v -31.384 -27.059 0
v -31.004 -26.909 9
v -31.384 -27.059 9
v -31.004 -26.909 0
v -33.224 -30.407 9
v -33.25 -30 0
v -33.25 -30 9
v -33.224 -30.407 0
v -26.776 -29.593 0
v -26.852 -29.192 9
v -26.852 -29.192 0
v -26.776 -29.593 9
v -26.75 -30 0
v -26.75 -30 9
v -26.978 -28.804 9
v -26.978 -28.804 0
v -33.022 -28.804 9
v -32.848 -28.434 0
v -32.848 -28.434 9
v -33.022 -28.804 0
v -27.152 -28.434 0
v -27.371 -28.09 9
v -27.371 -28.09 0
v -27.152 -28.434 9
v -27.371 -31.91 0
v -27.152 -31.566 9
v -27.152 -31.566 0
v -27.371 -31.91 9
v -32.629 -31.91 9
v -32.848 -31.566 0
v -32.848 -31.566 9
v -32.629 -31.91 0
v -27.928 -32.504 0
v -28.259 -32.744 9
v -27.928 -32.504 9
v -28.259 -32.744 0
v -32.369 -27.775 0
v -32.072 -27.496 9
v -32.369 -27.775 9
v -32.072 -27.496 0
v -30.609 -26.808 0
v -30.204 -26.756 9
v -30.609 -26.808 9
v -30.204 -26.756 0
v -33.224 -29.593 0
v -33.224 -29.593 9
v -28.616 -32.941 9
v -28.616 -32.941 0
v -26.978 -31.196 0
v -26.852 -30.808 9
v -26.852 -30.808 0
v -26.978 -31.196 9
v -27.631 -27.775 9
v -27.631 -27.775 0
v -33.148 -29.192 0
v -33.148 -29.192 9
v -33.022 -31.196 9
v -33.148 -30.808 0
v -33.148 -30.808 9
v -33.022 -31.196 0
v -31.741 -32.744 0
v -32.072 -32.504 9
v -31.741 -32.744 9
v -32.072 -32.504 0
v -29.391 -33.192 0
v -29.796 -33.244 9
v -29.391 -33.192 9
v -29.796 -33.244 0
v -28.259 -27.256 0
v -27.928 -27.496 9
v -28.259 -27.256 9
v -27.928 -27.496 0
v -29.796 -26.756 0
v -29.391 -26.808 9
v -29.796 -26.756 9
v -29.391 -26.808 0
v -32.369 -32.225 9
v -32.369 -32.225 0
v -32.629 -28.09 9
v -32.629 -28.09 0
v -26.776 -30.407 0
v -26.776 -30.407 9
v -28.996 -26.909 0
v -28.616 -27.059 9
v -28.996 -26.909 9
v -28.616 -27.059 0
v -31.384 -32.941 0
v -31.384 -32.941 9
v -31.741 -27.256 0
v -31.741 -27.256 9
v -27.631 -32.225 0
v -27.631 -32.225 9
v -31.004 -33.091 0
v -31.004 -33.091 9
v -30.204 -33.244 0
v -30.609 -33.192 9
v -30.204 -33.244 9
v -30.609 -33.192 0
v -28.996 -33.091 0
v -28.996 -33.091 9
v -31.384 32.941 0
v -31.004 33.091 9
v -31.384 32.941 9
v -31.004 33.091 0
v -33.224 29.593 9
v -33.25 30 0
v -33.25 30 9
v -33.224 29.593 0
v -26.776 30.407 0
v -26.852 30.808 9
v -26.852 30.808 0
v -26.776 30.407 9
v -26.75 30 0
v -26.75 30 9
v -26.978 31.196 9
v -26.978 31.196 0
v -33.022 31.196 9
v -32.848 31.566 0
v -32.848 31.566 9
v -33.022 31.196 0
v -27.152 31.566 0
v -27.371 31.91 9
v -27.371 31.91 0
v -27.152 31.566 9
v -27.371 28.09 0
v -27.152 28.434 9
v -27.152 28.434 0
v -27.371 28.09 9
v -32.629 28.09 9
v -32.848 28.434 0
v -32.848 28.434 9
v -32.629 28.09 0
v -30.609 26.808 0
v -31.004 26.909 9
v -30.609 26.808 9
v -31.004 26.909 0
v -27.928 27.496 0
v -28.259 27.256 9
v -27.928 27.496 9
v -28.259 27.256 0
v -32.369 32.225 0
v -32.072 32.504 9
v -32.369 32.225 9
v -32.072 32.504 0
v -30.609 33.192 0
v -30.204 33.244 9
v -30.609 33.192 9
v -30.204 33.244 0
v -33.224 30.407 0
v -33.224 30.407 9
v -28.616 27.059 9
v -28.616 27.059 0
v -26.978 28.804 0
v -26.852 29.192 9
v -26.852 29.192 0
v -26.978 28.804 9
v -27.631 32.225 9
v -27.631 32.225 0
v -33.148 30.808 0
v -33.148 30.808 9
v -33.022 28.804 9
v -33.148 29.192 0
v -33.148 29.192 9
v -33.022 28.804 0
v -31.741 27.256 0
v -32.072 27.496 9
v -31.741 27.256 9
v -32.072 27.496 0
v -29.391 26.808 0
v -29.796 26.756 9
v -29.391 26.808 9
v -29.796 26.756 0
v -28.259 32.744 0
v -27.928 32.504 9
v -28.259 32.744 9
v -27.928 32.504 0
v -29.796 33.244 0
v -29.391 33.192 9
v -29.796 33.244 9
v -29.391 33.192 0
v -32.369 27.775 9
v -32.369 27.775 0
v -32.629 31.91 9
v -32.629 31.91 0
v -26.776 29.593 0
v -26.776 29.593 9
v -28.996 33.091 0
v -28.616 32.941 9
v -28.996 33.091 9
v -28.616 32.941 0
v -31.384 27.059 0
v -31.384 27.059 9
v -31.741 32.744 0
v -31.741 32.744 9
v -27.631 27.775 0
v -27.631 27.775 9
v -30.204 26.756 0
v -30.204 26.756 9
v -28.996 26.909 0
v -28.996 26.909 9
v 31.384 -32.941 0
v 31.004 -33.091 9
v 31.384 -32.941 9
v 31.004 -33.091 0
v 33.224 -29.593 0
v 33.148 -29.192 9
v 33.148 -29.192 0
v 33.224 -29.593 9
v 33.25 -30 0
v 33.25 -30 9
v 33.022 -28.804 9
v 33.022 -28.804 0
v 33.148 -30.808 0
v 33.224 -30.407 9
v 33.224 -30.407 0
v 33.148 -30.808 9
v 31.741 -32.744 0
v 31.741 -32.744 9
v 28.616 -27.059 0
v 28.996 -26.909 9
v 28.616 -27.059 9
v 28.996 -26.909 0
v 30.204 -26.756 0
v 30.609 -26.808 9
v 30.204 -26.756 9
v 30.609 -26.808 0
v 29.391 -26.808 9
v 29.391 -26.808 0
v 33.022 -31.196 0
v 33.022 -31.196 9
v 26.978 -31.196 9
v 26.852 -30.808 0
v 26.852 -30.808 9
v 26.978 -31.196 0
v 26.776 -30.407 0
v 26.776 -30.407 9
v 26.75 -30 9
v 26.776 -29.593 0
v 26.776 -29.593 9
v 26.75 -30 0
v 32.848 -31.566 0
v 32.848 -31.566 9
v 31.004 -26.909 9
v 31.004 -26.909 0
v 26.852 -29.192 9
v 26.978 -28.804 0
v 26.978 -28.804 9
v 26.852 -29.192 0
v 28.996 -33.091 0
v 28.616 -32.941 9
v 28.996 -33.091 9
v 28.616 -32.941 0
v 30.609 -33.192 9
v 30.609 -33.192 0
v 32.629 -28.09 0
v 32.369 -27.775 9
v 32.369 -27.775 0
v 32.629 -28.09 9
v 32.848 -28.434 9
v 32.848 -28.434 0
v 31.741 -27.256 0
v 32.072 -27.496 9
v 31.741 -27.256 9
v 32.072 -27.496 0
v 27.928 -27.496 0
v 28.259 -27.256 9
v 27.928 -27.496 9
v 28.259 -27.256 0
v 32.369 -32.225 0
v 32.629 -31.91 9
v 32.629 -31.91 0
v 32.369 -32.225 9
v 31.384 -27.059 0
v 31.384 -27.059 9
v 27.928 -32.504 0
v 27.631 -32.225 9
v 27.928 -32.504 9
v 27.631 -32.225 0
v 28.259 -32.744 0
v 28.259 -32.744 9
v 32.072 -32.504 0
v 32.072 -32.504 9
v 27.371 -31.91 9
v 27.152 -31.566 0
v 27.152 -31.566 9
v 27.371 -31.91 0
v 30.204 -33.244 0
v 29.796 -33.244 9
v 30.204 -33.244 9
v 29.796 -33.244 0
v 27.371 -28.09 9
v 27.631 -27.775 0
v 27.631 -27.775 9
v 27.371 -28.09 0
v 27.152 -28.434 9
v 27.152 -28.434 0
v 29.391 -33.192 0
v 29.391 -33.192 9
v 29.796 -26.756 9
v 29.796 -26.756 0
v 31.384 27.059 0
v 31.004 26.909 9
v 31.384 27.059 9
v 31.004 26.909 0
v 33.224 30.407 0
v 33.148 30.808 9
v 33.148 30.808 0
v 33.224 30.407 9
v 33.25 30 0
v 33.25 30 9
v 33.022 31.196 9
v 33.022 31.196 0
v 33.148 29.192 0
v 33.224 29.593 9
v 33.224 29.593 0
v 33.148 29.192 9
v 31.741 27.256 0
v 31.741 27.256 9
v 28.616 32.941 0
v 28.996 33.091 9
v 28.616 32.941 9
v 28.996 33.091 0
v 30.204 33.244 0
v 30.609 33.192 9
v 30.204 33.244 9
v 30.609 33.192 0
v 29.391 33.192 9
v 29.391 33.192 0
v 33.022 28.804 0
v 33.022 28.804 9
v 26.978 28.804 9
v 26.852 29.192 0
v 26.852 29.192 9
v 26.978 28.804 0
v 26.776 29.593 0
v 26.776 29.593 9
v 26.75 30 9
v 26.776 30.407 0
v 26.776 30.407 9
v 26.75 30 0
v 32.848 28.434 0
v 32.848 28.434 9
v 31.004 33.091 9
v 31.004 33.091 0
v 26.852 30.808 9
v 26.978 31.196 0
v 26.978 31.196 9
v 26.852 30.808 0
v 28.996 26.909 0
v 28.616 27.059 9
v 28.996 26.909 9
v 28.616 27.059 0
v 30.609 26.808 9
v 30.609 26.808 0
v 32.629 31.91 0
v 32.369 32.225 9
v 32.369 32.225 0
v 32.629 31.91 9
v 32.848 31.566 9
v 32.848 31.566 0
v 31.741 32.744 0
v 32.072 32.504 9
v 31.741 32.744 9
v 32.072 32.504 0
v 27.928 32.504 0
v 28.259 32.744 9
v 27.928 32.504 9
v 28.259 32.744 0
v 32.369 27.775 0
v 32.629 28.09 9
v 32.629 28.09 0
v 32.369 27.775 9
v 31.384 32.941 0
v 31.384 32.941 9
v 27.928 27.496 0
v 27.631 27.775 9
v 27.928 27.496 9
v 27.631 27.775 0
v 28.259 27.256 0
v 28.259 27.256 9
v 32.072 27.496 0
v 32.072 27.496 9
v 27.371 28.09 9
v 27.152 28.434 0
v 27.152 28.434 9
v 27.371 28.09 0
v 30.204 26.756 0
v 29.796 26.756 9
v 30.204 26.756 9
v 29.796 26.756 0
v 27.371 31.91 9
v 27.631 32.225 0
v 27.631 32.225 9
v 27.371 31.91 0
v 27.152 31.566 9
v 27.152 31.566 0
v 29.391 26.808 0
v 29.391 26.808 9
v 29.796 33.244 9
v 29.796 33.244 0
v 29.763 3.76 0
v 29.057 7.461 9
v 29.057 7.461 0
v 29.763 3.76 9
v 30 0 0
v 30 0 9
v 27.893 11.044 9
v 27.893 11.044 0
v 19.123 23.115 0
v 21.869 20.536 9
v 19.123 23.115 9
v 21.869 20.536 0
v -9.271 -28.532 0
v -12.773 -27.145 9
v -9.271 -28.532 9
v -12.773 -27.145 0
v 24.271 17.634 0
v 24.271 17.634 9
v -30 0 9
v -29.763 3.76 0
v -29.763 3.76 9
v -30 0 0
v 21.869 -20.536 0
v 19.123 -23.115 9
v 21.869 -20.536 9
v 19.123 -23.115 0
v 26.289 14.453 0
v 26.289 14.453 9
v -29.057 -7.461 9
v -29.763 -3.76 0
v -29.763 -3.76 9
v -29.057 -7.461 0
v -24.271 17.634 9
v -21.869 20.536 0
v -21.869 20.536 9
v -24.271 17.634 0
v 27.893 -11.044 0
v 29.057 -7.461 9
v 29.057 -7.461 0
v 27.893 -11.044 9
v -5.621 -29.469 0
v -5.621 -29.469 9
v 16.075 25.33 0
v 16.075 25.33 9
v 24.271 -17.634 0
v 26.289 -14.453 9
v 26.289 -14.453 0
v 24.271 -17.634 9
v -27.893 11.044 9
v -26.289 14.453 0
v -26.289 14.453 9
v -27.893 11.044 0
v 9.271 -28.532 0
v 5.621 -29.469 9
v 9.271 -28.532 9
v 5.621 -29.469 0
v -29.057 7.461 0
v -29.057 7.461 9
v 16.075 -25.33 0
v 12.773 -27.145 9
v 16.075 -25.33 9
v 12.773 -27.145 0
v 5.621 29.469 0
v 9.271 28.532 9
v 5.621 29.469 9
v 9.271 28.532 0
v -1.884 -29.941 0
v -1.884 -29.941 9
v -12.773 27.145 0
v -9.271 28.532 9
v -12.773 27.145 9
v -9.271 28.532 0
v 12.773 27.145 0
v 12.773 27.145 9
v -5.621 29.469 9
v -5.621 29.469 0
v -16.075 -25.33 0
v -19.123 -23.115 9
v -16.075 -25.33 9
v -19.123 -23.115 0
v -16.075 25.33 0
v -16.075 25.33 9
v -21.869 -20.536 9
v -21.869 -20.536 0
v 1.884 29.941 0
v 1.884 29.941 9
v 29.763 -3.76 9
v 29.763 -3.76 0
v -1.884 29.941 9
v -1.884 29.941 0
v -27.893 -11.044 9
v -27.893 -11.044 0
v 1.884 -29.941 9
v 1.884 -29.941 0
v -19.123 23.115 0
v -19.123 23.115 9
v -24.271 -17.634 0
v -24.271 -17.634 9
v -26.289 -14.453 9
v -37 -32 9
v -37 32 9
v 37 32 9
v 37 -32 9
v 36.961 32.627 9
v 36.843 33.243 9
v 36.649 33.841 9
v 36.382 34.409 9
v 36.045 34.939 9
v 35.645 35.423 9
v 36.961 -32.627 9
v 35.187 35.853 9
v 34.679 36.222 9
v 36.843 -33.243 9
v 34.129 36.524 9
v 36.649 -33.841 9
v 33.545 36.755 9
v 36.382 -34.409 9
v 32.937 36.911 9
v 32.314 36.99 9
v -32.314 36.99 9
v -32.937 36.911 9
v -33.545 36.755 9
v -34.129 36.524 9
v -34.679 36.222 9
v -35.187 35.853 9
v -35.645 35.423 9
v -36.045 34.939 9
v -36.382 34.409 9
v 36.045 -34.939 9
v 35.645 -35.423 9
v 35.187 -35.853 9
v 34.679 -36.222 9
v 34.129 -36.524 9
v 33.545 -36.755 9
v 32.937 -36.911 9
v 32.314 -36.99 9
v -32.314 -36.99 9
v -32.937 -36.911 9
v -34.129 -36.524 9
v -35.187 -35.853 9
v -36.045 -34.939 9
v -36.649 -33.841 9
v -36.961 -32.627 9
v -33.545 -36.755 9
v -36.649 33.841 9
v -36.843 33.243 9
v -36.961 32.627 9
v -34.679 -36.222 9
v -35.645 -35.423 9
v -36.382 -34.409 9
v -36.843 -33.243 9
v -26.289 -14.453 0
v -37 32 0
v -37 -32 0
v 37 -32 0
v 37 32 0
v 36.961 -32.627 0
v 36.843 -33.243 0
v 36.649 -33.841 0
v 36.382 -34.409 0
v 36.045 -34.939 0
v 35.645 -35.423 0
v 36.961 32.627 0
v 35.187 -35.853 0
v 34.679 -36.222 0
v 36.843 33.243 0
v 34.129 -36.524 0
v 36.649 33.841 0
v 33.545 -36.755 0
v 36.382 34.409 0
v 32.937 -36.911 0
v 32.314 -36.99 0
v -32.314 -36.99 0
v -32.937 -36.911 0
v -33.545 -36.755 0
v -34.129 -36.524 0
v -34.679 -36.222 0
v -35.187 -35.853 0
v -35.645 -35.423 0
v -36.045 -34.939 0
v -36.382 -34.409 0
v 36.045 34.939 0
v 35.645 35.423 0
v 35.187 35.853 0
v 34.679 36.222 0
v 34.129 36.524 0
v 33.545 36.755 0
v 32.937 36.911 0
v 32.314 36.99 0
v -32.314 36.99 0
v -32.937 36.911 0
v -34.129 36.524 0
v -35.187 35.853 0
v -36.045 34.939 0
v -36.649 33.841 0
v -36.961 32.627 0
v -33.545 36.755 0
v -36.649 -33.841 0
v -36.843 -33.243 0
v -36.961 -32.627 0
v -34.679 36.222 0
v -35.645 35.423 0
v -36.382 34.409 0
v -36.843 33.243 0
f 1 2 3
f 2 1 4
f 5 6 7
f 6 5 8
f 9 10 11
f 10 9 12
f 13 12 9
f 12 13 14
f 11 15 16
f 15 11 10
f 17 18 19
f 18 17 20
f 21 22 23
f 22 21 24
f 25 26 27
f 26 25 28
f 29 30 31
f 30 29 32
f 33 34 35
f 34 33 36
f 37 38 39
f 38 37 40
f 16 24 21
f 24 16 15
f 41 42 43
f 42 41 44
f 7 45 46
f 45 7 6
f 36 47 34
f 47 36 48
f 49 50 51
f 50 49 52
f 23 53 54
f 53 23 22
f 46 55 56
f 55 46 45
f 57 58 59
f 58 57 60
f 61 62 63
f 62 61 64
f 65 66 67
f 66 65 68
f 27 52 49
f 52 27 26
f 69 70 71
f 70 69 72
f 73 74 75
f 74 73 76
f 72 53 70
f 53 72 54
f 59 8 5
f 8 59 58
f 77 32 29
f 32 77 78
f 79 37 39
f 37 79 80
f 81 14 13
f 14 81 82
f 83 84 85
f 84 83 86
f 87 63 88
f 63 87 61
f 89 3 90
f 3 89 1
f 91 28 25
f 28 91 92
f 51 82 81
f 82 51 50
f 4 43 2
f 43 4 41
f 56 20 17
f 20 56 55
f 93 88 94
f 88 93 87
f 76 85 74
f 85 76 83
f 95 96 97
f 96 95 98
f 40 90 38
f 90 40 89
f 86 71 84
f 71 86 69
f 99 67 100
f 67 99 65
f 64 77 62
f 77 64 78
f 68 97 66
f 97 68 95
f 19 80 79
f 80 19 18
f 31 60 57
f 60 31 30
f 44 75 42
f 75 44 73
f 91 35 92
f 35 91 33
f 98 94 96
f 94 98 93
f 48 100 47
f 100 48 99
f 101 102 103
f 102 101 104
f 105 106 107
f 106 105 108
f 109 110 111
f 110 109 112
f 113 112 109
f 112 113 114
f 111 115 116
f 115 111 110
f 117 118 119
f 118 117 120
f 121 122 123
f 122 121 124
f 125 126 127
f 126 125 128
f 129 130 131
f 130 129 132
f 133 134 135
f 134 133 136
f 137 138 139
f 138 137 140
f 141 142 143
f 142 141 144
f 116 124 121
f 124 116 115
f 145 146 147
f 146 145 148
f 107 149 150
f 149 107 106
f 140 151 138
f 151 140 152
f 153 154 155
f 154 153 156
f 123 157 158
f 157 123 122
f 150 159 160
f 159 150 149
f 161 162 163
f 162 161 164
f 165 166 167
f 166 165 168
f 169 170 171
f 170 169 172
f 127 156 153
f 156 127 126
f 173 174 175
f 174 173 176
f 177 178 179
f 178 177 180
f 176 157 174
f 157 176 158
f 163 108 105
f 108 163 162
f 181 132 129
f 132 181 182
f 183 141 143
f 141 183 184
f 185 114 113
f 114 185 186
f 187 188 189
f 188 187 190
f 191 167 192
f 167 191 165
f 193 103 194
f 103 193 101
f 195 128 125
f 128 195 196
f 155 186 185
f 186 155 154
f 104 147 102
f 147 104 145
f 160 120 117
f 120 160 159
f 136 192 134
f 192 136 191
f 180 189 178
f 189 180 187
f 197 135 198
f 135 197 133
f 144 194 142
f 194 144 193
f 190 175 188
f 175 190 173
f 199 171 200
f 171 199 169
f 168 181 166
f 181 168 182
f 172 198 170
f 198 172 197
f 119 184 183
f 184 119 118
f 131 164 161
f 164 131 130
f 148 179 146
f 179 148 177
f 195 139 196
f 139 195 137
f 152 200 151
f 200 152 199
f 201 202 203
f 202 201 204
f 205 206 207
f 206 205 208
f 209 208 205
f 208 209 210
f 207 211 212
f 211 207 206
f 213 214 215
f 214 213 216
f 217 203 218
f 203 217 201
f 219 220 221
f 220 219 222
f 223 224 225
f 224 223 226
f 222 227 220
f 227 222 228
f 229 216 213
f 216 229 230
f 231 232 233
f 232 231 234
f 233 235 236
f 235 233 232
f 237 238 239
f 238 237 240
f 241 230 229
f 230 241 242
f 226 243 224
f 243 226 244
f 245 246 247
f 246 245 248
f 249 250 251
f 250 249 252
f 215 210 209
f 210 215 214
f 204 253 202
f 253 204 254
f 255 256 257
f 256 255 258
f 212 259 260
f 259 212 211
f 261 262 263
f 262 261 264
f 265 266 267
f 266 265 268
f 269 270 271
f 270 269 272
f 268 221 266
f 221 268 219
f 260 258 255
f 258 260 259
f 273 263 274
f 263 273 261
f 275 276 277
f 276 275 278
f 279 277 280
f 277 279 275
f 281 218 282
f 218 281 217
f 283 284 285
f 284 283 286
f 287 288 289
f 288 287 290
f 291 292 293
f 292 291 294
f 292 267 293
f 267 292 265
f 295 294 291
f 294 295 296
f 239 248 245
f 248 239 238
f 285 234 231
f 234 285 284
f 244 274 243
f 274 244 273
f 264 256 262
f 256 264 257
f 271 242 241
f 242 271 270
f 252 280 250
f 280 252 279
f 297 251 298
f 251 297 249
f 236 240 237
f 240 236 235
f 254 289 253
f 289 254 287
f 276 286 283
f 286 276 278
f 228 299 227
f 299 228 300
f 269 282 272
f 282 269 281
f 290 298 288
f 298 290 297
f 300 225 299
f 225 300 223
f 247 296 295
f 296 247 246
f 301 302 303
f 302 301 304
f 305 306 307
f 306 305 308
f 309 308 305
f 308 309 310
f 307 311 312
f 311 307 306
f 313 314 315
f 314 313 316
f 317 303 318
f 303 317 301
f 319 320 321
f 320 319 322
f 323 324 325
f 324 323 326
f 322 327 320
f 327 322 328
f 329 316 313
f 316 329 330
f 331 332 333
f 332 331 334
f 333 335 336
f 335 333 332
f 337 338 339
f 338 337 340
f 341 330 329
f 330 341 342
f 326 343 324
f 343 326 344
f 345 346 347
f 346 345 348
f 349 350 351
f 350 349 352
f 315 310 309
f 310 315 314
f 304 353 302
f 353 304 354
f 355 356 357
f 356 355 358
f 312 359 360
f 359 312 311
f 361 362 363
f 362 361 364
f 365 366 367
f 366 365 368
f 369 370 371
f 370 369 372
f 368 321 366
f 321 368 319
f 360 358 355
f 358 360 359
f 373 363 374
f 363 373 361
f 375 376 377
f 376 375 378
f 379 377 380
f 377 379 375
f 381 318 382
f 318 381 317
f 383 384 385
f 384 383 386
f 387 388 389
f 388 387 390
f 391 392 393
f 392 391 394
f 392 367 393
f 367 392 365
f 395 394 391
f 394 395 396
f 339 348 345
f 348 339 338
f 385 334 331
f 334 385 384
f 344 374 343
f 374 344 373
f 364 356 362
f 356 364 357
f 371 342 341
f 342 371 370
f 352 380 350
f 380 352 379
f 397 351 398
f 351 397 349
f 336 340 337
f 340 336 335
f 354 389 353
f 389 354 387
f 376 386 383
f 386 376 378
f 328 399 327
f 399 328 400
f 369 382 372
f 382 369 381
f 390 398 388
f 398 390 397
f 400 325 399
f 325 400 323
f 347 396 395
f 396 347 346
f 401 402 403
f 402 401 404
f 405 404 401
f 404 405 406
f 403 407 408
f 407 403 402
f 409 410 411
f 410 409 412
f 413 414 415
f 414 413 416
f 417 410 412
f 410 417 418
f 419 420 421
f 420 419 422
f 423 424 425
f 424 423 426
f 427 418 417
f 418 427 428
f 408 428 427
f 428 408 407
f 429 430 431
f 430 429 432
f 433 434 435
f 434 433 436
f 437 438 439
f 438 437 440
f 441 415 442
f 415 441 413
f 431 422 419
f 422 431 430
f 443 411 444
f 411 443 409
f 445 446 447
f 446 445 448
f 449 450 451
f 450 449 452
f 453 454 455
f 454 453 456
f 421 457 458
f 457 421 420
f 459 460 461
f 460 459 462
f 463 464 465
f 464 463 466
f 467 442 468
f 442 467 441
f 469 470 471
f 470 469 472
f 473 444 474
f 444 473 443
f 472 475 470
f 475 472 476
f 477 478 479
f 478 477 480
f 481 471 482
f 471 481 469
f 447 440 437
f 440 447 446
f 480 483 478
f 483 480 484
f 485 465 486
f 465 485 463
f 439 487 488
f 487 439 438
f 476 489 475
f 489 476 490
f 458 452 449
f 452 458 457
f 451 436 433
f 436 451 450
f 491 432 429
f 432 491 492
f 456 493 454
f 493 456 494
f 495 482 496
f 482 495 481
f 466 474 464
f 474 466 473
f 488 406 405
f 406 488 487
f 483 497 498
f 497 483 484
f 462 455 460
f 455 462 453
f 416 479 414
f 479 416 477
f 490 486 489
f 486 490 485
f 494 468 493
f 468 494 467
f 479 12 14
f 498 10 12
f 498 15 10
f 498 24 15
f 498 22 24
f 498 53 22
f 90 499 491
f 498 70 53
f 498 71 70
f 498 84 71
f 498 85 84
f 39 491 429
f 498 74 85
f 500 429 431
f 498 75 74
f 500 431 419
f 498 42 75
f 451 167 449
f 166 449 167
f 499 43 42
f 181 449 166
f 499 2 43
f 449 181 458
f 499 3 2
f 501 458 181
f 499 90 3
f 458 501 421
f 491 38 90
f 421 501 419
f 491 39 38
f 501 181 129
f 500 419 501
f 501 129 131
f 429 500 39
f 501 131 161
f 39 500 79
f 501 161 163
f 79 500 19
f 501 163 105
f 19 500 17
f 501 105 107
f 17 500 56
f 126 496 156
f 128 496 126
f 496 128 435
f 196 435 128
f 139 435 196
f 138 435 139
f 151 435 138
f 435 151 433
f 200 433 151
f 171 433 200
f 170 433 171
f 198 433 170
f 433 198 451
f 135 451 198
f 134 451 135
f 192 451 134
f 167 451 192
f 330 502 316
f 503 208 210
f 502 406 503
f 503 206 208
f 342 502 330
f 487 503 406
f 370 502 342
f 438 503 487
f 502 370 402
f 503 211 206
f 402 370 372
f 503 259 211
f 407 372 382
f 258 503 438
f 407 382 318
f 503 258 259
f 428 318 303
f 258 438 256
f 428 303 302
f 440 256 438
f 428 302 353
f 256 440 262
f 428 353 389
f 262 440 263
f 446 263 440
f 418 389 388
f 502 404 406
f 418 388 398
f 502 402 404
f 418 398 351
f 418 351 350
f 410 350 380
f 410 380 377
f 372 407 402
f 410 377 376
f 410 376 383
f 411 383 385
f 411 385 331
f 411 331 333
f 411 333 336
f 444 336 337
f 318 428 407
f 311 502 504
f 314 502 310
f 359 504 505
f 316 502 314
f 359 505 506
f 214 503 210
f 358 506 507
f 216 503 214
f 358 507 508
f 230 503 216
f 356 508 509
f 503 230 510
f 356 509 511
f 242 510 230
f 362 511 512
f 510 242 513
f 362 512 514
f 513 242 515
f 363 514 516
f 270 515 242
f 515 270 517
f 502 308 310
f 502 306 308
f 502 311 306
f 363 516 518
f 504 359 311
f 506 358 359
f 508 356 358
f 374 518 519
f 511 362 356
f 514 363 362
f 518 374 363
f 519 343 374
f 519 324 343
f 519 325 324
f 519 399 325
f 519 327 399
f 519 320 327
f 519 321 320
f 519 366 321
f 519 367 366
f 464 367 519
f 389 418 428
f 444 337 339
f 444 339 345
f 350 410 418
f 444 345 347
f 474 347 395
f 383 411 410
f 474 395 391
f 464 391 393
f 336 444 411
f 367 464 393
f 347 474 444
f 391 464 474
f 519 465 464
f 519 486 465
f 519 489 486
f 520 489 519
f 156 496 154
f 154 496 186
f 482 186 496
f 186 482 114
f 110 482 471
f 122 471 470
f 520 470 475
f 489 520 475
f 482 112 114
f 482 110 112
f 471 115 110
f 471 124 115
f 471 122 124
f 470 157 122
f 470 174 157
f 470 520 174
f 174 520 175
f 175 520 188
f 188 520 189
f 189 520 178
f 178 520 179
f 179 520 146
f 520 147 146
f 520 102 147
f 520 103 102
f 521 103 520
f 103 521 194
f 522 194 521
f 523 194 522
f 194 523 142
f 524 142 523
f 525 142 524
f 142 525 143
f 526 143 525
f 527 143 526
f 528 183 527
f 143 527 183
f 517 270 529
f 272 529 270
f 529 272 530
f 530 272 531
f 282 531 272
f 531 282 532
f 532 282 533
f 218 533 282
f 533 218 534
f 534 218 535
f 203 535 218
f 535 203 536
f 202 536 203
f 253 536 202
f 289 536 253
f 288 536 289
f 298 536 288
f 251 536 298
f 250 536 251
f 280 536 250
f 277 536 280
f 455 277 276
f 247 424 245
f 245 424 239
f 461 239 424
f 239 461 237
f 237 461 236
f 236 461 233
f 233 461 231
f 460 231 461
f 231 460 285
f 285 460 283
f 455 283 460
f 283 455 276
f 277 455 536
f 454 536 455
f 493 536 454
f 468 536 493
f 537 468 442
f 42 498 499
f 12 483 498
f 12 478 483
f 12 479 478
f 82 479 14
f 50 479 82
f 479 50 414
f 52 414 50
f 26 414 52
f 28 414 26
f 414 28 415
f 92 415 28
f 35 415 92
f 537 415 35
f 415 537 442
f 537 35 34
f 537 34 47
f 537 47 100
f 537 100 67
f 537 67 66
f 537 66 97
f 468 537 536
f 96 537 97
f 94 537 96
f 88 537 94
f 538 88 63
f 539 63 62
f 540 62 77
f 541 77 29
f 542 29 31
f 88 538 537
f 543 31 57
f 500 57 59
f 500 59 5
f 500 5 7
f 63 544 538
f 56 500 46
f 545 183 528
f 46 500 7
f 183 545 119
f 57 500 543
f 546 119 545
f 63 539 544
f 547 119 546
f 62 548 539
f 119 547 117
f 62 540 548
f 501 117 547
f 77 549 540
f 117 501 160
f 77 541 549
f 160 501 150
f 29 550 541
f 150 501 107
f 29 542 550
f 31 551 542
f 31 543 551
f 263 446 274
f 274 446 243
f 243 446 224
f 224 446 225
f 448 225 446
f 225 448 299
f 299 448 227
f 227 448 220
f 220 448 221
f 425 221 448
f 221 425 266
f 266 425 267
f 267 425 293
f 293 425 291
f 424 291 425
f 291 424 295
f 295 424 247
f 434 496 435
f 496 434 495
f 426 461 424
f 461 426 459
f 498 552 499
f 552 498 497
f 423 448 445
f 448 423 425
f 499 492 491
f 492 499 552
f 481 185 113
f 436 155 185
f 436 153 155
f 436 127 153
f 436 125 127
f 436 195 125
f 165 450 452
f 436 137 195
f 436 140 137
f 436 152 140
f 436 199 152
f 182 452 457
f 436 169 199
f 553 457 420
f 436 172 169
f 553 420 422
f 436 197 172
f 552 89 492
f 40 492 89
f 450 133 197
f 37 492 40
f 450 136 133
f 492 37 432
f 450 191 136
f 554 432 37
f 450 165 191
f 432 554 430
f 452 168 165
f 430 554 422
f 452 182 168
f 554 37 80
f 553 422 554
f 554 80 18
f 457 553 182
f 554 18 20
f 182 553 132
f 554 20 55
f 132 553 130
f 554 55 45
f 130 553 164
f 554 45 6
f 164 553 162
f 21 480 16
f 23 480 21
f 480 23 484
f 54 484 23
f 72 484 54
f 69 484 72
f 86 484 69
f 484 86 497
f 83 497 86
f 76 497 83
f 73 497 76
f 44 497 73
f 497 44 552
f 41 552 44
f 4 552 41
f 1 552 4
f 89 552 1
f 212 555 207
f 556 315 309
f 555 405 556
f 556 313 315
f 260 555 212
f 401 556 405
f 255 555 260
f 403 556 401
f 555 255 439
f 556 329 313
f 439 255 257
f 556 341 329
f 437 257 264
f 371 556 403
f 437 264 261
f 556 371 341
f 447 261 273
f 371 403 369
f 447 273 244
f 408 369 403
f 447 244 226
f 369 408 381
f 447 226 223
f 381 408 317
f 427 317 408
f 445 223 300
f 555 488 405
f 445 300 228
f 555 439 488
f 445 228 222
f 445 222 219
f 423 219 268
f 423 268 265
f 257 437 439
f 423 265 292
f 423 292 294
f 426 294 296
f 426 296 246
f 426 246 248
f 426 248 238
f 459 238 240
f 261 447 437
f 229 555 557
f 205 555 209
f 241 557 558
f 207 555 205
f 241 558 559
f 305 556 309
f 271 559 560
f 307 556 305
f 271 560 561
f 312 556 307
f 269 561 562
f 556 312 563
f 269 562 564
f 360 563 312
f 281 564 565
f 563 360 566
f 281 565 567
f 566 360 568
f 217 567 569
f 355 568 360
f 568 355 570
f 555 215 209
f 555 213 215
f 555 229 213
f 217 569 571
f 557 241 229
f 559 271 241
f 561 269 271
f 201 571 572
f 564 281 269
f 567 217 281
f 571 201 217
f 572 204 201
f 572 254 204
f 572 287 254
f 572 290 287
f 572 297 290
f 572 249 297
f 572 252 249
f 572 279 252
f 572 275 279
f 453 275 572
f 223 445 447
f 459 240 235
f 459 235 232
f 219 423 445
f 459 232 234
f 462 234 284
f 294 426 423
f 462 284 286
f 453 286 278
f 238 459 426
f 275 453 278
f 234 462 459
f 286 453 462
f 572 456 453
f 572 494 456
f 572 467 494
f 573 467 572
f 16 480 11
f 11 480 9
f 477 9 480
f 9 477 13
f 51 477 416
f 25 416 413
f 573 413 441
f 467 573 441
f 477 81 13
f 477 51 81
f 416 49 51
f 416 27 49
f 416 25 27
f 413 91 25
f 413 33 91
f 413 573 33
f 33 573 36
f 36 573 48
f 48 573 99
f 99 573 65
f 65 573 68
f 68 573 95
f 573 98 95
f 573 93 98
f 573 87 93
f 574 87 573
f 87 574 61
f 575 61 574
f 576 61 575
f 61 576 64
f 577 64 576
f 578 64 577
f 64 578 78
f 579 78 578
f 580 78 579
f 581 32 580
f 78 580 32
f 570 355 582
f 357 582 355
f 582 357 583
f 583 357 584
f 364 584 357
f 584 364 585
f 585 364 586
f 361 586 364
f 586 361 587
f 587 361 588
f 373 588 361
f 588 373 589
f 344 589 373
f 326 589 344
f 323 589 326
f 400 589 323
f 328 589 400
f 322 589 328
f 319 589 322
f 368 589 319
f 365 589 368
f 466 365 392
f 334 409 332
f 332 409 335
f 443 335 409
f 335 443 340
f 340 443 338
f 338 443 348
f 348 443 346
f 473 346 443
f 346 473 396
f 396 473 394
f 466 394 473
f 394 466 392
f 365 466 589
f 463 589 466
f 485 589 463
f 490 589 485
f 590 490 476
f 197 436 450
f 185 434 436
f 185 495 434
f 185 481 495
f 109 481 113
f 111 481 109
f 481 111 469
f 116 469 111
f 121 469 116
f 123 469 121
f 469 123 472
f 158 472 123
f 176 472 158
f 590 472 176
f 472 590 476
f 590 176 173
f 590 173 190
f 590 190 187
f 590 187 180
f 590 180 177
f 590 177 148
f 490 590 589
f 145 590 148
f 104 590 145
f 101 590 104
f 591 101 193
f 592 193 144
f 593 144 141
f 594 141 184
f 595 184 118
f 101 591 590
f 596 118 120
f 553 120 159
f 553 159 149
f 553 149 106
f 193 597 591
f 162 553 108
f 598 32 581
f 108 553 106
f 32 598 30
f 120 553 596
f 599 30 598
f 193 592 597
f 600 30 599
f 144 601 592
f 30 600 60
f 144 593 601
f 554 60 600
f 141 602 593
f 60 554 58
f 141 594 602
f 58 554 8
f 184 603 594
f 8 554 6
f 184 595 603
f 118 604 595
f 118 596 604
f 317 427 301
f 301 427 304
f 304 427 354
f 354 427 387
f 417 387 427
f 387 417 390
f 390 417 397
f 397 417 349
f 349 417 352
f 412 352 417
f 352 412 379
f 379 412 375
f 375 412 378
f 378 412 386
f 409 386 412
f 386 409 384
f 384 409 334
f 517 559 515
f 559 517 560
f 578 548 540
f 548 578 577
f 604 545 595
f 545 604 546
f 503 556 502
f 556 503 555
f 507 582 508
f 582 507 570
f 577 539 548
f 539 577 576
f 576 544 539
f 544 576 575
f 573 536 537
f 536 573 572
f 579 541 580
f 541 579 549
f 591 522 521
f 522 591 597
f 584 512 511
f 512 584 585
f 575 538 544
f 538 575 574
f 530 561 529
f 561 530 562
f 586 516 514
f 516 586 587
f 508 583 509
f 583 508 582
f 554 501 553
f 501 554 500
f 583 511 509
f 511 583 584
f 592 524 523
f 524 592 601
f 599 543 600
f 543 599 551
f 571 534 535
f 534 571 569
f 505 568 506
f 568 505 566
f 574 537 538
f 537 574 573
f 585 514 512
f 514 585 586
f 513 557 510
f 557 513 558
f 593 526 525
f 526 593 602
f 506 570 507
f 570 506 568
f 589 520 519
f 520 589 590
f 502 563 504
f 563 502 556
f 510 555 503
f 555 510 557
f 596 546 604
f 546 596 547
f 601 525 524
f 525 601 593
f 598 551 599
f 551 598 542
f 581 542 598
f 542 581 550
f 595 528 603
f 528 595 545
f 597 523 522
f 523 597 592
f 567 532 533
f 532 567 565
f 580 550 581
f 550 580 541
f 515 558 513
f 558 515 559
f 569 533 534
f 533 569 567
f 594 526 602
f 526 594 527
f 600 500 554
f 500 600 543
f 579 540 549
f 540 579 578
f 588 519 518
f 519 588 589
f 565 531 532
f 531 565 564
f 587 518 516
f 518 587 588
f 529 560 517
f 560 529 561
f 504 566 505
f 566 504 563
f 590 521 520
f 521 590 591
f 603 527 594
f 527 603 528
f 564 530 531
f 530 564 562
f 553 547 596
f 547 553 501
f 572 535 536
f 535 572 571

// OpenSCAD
$fn = 50;

difference() {
	union() {
		hull() {
			translate(v = [-32.0, 32.0, 0]) {
				cylinder(h = 9, r = 5);
			}
			translate(v = [32.0, 32.0, 0]) {
				cylinder(h = 9, r = 5);
			}
			translate(v = [-32.0, -32.0, 0]) {
				cylinder(h = 9, r = 5);
			}
			translate(v = [32.0, -32.0, 0]) {
				cylinder(h = 9, r = 5);
			}
		}
	}
	union() {
		translate(v = [-30.0, -30.0, -100.0]) {
			cylinder(h = 200, r = 3.25);
		}
		translate(v = [-30.0, 30.0, -100.0]) {
			cylinder(h = 200, r = 3.25);
		}
		translate(v = [30.0, -30.0, -100.0]) {
			cylinder(h = 200, r = 3.25);
		}
		translate(v = [30.0, 30.0, -100.0]) {
			cylinder(h = 200, r = 3.25);
		}
		translate(v = [-30.0, -30.0, -100.0]) {
			cylinder(h = 200, r = 1.8);
		}
		translate(v = [-30.0, 30.0, -100.0]) {
			cylinder(h = 200, r = 1.8);
		}
		translate(v = [30.0, -30.0, -100.0]) {
			cylinder(h = 200, r = 1.8);
		}
		translate(v = [30.0, 30.0, -100.0]) {
			cylinder(h = 200, r = 1.8);
		}
		cylinder(h = 9, r = 30.0);
	}
}
